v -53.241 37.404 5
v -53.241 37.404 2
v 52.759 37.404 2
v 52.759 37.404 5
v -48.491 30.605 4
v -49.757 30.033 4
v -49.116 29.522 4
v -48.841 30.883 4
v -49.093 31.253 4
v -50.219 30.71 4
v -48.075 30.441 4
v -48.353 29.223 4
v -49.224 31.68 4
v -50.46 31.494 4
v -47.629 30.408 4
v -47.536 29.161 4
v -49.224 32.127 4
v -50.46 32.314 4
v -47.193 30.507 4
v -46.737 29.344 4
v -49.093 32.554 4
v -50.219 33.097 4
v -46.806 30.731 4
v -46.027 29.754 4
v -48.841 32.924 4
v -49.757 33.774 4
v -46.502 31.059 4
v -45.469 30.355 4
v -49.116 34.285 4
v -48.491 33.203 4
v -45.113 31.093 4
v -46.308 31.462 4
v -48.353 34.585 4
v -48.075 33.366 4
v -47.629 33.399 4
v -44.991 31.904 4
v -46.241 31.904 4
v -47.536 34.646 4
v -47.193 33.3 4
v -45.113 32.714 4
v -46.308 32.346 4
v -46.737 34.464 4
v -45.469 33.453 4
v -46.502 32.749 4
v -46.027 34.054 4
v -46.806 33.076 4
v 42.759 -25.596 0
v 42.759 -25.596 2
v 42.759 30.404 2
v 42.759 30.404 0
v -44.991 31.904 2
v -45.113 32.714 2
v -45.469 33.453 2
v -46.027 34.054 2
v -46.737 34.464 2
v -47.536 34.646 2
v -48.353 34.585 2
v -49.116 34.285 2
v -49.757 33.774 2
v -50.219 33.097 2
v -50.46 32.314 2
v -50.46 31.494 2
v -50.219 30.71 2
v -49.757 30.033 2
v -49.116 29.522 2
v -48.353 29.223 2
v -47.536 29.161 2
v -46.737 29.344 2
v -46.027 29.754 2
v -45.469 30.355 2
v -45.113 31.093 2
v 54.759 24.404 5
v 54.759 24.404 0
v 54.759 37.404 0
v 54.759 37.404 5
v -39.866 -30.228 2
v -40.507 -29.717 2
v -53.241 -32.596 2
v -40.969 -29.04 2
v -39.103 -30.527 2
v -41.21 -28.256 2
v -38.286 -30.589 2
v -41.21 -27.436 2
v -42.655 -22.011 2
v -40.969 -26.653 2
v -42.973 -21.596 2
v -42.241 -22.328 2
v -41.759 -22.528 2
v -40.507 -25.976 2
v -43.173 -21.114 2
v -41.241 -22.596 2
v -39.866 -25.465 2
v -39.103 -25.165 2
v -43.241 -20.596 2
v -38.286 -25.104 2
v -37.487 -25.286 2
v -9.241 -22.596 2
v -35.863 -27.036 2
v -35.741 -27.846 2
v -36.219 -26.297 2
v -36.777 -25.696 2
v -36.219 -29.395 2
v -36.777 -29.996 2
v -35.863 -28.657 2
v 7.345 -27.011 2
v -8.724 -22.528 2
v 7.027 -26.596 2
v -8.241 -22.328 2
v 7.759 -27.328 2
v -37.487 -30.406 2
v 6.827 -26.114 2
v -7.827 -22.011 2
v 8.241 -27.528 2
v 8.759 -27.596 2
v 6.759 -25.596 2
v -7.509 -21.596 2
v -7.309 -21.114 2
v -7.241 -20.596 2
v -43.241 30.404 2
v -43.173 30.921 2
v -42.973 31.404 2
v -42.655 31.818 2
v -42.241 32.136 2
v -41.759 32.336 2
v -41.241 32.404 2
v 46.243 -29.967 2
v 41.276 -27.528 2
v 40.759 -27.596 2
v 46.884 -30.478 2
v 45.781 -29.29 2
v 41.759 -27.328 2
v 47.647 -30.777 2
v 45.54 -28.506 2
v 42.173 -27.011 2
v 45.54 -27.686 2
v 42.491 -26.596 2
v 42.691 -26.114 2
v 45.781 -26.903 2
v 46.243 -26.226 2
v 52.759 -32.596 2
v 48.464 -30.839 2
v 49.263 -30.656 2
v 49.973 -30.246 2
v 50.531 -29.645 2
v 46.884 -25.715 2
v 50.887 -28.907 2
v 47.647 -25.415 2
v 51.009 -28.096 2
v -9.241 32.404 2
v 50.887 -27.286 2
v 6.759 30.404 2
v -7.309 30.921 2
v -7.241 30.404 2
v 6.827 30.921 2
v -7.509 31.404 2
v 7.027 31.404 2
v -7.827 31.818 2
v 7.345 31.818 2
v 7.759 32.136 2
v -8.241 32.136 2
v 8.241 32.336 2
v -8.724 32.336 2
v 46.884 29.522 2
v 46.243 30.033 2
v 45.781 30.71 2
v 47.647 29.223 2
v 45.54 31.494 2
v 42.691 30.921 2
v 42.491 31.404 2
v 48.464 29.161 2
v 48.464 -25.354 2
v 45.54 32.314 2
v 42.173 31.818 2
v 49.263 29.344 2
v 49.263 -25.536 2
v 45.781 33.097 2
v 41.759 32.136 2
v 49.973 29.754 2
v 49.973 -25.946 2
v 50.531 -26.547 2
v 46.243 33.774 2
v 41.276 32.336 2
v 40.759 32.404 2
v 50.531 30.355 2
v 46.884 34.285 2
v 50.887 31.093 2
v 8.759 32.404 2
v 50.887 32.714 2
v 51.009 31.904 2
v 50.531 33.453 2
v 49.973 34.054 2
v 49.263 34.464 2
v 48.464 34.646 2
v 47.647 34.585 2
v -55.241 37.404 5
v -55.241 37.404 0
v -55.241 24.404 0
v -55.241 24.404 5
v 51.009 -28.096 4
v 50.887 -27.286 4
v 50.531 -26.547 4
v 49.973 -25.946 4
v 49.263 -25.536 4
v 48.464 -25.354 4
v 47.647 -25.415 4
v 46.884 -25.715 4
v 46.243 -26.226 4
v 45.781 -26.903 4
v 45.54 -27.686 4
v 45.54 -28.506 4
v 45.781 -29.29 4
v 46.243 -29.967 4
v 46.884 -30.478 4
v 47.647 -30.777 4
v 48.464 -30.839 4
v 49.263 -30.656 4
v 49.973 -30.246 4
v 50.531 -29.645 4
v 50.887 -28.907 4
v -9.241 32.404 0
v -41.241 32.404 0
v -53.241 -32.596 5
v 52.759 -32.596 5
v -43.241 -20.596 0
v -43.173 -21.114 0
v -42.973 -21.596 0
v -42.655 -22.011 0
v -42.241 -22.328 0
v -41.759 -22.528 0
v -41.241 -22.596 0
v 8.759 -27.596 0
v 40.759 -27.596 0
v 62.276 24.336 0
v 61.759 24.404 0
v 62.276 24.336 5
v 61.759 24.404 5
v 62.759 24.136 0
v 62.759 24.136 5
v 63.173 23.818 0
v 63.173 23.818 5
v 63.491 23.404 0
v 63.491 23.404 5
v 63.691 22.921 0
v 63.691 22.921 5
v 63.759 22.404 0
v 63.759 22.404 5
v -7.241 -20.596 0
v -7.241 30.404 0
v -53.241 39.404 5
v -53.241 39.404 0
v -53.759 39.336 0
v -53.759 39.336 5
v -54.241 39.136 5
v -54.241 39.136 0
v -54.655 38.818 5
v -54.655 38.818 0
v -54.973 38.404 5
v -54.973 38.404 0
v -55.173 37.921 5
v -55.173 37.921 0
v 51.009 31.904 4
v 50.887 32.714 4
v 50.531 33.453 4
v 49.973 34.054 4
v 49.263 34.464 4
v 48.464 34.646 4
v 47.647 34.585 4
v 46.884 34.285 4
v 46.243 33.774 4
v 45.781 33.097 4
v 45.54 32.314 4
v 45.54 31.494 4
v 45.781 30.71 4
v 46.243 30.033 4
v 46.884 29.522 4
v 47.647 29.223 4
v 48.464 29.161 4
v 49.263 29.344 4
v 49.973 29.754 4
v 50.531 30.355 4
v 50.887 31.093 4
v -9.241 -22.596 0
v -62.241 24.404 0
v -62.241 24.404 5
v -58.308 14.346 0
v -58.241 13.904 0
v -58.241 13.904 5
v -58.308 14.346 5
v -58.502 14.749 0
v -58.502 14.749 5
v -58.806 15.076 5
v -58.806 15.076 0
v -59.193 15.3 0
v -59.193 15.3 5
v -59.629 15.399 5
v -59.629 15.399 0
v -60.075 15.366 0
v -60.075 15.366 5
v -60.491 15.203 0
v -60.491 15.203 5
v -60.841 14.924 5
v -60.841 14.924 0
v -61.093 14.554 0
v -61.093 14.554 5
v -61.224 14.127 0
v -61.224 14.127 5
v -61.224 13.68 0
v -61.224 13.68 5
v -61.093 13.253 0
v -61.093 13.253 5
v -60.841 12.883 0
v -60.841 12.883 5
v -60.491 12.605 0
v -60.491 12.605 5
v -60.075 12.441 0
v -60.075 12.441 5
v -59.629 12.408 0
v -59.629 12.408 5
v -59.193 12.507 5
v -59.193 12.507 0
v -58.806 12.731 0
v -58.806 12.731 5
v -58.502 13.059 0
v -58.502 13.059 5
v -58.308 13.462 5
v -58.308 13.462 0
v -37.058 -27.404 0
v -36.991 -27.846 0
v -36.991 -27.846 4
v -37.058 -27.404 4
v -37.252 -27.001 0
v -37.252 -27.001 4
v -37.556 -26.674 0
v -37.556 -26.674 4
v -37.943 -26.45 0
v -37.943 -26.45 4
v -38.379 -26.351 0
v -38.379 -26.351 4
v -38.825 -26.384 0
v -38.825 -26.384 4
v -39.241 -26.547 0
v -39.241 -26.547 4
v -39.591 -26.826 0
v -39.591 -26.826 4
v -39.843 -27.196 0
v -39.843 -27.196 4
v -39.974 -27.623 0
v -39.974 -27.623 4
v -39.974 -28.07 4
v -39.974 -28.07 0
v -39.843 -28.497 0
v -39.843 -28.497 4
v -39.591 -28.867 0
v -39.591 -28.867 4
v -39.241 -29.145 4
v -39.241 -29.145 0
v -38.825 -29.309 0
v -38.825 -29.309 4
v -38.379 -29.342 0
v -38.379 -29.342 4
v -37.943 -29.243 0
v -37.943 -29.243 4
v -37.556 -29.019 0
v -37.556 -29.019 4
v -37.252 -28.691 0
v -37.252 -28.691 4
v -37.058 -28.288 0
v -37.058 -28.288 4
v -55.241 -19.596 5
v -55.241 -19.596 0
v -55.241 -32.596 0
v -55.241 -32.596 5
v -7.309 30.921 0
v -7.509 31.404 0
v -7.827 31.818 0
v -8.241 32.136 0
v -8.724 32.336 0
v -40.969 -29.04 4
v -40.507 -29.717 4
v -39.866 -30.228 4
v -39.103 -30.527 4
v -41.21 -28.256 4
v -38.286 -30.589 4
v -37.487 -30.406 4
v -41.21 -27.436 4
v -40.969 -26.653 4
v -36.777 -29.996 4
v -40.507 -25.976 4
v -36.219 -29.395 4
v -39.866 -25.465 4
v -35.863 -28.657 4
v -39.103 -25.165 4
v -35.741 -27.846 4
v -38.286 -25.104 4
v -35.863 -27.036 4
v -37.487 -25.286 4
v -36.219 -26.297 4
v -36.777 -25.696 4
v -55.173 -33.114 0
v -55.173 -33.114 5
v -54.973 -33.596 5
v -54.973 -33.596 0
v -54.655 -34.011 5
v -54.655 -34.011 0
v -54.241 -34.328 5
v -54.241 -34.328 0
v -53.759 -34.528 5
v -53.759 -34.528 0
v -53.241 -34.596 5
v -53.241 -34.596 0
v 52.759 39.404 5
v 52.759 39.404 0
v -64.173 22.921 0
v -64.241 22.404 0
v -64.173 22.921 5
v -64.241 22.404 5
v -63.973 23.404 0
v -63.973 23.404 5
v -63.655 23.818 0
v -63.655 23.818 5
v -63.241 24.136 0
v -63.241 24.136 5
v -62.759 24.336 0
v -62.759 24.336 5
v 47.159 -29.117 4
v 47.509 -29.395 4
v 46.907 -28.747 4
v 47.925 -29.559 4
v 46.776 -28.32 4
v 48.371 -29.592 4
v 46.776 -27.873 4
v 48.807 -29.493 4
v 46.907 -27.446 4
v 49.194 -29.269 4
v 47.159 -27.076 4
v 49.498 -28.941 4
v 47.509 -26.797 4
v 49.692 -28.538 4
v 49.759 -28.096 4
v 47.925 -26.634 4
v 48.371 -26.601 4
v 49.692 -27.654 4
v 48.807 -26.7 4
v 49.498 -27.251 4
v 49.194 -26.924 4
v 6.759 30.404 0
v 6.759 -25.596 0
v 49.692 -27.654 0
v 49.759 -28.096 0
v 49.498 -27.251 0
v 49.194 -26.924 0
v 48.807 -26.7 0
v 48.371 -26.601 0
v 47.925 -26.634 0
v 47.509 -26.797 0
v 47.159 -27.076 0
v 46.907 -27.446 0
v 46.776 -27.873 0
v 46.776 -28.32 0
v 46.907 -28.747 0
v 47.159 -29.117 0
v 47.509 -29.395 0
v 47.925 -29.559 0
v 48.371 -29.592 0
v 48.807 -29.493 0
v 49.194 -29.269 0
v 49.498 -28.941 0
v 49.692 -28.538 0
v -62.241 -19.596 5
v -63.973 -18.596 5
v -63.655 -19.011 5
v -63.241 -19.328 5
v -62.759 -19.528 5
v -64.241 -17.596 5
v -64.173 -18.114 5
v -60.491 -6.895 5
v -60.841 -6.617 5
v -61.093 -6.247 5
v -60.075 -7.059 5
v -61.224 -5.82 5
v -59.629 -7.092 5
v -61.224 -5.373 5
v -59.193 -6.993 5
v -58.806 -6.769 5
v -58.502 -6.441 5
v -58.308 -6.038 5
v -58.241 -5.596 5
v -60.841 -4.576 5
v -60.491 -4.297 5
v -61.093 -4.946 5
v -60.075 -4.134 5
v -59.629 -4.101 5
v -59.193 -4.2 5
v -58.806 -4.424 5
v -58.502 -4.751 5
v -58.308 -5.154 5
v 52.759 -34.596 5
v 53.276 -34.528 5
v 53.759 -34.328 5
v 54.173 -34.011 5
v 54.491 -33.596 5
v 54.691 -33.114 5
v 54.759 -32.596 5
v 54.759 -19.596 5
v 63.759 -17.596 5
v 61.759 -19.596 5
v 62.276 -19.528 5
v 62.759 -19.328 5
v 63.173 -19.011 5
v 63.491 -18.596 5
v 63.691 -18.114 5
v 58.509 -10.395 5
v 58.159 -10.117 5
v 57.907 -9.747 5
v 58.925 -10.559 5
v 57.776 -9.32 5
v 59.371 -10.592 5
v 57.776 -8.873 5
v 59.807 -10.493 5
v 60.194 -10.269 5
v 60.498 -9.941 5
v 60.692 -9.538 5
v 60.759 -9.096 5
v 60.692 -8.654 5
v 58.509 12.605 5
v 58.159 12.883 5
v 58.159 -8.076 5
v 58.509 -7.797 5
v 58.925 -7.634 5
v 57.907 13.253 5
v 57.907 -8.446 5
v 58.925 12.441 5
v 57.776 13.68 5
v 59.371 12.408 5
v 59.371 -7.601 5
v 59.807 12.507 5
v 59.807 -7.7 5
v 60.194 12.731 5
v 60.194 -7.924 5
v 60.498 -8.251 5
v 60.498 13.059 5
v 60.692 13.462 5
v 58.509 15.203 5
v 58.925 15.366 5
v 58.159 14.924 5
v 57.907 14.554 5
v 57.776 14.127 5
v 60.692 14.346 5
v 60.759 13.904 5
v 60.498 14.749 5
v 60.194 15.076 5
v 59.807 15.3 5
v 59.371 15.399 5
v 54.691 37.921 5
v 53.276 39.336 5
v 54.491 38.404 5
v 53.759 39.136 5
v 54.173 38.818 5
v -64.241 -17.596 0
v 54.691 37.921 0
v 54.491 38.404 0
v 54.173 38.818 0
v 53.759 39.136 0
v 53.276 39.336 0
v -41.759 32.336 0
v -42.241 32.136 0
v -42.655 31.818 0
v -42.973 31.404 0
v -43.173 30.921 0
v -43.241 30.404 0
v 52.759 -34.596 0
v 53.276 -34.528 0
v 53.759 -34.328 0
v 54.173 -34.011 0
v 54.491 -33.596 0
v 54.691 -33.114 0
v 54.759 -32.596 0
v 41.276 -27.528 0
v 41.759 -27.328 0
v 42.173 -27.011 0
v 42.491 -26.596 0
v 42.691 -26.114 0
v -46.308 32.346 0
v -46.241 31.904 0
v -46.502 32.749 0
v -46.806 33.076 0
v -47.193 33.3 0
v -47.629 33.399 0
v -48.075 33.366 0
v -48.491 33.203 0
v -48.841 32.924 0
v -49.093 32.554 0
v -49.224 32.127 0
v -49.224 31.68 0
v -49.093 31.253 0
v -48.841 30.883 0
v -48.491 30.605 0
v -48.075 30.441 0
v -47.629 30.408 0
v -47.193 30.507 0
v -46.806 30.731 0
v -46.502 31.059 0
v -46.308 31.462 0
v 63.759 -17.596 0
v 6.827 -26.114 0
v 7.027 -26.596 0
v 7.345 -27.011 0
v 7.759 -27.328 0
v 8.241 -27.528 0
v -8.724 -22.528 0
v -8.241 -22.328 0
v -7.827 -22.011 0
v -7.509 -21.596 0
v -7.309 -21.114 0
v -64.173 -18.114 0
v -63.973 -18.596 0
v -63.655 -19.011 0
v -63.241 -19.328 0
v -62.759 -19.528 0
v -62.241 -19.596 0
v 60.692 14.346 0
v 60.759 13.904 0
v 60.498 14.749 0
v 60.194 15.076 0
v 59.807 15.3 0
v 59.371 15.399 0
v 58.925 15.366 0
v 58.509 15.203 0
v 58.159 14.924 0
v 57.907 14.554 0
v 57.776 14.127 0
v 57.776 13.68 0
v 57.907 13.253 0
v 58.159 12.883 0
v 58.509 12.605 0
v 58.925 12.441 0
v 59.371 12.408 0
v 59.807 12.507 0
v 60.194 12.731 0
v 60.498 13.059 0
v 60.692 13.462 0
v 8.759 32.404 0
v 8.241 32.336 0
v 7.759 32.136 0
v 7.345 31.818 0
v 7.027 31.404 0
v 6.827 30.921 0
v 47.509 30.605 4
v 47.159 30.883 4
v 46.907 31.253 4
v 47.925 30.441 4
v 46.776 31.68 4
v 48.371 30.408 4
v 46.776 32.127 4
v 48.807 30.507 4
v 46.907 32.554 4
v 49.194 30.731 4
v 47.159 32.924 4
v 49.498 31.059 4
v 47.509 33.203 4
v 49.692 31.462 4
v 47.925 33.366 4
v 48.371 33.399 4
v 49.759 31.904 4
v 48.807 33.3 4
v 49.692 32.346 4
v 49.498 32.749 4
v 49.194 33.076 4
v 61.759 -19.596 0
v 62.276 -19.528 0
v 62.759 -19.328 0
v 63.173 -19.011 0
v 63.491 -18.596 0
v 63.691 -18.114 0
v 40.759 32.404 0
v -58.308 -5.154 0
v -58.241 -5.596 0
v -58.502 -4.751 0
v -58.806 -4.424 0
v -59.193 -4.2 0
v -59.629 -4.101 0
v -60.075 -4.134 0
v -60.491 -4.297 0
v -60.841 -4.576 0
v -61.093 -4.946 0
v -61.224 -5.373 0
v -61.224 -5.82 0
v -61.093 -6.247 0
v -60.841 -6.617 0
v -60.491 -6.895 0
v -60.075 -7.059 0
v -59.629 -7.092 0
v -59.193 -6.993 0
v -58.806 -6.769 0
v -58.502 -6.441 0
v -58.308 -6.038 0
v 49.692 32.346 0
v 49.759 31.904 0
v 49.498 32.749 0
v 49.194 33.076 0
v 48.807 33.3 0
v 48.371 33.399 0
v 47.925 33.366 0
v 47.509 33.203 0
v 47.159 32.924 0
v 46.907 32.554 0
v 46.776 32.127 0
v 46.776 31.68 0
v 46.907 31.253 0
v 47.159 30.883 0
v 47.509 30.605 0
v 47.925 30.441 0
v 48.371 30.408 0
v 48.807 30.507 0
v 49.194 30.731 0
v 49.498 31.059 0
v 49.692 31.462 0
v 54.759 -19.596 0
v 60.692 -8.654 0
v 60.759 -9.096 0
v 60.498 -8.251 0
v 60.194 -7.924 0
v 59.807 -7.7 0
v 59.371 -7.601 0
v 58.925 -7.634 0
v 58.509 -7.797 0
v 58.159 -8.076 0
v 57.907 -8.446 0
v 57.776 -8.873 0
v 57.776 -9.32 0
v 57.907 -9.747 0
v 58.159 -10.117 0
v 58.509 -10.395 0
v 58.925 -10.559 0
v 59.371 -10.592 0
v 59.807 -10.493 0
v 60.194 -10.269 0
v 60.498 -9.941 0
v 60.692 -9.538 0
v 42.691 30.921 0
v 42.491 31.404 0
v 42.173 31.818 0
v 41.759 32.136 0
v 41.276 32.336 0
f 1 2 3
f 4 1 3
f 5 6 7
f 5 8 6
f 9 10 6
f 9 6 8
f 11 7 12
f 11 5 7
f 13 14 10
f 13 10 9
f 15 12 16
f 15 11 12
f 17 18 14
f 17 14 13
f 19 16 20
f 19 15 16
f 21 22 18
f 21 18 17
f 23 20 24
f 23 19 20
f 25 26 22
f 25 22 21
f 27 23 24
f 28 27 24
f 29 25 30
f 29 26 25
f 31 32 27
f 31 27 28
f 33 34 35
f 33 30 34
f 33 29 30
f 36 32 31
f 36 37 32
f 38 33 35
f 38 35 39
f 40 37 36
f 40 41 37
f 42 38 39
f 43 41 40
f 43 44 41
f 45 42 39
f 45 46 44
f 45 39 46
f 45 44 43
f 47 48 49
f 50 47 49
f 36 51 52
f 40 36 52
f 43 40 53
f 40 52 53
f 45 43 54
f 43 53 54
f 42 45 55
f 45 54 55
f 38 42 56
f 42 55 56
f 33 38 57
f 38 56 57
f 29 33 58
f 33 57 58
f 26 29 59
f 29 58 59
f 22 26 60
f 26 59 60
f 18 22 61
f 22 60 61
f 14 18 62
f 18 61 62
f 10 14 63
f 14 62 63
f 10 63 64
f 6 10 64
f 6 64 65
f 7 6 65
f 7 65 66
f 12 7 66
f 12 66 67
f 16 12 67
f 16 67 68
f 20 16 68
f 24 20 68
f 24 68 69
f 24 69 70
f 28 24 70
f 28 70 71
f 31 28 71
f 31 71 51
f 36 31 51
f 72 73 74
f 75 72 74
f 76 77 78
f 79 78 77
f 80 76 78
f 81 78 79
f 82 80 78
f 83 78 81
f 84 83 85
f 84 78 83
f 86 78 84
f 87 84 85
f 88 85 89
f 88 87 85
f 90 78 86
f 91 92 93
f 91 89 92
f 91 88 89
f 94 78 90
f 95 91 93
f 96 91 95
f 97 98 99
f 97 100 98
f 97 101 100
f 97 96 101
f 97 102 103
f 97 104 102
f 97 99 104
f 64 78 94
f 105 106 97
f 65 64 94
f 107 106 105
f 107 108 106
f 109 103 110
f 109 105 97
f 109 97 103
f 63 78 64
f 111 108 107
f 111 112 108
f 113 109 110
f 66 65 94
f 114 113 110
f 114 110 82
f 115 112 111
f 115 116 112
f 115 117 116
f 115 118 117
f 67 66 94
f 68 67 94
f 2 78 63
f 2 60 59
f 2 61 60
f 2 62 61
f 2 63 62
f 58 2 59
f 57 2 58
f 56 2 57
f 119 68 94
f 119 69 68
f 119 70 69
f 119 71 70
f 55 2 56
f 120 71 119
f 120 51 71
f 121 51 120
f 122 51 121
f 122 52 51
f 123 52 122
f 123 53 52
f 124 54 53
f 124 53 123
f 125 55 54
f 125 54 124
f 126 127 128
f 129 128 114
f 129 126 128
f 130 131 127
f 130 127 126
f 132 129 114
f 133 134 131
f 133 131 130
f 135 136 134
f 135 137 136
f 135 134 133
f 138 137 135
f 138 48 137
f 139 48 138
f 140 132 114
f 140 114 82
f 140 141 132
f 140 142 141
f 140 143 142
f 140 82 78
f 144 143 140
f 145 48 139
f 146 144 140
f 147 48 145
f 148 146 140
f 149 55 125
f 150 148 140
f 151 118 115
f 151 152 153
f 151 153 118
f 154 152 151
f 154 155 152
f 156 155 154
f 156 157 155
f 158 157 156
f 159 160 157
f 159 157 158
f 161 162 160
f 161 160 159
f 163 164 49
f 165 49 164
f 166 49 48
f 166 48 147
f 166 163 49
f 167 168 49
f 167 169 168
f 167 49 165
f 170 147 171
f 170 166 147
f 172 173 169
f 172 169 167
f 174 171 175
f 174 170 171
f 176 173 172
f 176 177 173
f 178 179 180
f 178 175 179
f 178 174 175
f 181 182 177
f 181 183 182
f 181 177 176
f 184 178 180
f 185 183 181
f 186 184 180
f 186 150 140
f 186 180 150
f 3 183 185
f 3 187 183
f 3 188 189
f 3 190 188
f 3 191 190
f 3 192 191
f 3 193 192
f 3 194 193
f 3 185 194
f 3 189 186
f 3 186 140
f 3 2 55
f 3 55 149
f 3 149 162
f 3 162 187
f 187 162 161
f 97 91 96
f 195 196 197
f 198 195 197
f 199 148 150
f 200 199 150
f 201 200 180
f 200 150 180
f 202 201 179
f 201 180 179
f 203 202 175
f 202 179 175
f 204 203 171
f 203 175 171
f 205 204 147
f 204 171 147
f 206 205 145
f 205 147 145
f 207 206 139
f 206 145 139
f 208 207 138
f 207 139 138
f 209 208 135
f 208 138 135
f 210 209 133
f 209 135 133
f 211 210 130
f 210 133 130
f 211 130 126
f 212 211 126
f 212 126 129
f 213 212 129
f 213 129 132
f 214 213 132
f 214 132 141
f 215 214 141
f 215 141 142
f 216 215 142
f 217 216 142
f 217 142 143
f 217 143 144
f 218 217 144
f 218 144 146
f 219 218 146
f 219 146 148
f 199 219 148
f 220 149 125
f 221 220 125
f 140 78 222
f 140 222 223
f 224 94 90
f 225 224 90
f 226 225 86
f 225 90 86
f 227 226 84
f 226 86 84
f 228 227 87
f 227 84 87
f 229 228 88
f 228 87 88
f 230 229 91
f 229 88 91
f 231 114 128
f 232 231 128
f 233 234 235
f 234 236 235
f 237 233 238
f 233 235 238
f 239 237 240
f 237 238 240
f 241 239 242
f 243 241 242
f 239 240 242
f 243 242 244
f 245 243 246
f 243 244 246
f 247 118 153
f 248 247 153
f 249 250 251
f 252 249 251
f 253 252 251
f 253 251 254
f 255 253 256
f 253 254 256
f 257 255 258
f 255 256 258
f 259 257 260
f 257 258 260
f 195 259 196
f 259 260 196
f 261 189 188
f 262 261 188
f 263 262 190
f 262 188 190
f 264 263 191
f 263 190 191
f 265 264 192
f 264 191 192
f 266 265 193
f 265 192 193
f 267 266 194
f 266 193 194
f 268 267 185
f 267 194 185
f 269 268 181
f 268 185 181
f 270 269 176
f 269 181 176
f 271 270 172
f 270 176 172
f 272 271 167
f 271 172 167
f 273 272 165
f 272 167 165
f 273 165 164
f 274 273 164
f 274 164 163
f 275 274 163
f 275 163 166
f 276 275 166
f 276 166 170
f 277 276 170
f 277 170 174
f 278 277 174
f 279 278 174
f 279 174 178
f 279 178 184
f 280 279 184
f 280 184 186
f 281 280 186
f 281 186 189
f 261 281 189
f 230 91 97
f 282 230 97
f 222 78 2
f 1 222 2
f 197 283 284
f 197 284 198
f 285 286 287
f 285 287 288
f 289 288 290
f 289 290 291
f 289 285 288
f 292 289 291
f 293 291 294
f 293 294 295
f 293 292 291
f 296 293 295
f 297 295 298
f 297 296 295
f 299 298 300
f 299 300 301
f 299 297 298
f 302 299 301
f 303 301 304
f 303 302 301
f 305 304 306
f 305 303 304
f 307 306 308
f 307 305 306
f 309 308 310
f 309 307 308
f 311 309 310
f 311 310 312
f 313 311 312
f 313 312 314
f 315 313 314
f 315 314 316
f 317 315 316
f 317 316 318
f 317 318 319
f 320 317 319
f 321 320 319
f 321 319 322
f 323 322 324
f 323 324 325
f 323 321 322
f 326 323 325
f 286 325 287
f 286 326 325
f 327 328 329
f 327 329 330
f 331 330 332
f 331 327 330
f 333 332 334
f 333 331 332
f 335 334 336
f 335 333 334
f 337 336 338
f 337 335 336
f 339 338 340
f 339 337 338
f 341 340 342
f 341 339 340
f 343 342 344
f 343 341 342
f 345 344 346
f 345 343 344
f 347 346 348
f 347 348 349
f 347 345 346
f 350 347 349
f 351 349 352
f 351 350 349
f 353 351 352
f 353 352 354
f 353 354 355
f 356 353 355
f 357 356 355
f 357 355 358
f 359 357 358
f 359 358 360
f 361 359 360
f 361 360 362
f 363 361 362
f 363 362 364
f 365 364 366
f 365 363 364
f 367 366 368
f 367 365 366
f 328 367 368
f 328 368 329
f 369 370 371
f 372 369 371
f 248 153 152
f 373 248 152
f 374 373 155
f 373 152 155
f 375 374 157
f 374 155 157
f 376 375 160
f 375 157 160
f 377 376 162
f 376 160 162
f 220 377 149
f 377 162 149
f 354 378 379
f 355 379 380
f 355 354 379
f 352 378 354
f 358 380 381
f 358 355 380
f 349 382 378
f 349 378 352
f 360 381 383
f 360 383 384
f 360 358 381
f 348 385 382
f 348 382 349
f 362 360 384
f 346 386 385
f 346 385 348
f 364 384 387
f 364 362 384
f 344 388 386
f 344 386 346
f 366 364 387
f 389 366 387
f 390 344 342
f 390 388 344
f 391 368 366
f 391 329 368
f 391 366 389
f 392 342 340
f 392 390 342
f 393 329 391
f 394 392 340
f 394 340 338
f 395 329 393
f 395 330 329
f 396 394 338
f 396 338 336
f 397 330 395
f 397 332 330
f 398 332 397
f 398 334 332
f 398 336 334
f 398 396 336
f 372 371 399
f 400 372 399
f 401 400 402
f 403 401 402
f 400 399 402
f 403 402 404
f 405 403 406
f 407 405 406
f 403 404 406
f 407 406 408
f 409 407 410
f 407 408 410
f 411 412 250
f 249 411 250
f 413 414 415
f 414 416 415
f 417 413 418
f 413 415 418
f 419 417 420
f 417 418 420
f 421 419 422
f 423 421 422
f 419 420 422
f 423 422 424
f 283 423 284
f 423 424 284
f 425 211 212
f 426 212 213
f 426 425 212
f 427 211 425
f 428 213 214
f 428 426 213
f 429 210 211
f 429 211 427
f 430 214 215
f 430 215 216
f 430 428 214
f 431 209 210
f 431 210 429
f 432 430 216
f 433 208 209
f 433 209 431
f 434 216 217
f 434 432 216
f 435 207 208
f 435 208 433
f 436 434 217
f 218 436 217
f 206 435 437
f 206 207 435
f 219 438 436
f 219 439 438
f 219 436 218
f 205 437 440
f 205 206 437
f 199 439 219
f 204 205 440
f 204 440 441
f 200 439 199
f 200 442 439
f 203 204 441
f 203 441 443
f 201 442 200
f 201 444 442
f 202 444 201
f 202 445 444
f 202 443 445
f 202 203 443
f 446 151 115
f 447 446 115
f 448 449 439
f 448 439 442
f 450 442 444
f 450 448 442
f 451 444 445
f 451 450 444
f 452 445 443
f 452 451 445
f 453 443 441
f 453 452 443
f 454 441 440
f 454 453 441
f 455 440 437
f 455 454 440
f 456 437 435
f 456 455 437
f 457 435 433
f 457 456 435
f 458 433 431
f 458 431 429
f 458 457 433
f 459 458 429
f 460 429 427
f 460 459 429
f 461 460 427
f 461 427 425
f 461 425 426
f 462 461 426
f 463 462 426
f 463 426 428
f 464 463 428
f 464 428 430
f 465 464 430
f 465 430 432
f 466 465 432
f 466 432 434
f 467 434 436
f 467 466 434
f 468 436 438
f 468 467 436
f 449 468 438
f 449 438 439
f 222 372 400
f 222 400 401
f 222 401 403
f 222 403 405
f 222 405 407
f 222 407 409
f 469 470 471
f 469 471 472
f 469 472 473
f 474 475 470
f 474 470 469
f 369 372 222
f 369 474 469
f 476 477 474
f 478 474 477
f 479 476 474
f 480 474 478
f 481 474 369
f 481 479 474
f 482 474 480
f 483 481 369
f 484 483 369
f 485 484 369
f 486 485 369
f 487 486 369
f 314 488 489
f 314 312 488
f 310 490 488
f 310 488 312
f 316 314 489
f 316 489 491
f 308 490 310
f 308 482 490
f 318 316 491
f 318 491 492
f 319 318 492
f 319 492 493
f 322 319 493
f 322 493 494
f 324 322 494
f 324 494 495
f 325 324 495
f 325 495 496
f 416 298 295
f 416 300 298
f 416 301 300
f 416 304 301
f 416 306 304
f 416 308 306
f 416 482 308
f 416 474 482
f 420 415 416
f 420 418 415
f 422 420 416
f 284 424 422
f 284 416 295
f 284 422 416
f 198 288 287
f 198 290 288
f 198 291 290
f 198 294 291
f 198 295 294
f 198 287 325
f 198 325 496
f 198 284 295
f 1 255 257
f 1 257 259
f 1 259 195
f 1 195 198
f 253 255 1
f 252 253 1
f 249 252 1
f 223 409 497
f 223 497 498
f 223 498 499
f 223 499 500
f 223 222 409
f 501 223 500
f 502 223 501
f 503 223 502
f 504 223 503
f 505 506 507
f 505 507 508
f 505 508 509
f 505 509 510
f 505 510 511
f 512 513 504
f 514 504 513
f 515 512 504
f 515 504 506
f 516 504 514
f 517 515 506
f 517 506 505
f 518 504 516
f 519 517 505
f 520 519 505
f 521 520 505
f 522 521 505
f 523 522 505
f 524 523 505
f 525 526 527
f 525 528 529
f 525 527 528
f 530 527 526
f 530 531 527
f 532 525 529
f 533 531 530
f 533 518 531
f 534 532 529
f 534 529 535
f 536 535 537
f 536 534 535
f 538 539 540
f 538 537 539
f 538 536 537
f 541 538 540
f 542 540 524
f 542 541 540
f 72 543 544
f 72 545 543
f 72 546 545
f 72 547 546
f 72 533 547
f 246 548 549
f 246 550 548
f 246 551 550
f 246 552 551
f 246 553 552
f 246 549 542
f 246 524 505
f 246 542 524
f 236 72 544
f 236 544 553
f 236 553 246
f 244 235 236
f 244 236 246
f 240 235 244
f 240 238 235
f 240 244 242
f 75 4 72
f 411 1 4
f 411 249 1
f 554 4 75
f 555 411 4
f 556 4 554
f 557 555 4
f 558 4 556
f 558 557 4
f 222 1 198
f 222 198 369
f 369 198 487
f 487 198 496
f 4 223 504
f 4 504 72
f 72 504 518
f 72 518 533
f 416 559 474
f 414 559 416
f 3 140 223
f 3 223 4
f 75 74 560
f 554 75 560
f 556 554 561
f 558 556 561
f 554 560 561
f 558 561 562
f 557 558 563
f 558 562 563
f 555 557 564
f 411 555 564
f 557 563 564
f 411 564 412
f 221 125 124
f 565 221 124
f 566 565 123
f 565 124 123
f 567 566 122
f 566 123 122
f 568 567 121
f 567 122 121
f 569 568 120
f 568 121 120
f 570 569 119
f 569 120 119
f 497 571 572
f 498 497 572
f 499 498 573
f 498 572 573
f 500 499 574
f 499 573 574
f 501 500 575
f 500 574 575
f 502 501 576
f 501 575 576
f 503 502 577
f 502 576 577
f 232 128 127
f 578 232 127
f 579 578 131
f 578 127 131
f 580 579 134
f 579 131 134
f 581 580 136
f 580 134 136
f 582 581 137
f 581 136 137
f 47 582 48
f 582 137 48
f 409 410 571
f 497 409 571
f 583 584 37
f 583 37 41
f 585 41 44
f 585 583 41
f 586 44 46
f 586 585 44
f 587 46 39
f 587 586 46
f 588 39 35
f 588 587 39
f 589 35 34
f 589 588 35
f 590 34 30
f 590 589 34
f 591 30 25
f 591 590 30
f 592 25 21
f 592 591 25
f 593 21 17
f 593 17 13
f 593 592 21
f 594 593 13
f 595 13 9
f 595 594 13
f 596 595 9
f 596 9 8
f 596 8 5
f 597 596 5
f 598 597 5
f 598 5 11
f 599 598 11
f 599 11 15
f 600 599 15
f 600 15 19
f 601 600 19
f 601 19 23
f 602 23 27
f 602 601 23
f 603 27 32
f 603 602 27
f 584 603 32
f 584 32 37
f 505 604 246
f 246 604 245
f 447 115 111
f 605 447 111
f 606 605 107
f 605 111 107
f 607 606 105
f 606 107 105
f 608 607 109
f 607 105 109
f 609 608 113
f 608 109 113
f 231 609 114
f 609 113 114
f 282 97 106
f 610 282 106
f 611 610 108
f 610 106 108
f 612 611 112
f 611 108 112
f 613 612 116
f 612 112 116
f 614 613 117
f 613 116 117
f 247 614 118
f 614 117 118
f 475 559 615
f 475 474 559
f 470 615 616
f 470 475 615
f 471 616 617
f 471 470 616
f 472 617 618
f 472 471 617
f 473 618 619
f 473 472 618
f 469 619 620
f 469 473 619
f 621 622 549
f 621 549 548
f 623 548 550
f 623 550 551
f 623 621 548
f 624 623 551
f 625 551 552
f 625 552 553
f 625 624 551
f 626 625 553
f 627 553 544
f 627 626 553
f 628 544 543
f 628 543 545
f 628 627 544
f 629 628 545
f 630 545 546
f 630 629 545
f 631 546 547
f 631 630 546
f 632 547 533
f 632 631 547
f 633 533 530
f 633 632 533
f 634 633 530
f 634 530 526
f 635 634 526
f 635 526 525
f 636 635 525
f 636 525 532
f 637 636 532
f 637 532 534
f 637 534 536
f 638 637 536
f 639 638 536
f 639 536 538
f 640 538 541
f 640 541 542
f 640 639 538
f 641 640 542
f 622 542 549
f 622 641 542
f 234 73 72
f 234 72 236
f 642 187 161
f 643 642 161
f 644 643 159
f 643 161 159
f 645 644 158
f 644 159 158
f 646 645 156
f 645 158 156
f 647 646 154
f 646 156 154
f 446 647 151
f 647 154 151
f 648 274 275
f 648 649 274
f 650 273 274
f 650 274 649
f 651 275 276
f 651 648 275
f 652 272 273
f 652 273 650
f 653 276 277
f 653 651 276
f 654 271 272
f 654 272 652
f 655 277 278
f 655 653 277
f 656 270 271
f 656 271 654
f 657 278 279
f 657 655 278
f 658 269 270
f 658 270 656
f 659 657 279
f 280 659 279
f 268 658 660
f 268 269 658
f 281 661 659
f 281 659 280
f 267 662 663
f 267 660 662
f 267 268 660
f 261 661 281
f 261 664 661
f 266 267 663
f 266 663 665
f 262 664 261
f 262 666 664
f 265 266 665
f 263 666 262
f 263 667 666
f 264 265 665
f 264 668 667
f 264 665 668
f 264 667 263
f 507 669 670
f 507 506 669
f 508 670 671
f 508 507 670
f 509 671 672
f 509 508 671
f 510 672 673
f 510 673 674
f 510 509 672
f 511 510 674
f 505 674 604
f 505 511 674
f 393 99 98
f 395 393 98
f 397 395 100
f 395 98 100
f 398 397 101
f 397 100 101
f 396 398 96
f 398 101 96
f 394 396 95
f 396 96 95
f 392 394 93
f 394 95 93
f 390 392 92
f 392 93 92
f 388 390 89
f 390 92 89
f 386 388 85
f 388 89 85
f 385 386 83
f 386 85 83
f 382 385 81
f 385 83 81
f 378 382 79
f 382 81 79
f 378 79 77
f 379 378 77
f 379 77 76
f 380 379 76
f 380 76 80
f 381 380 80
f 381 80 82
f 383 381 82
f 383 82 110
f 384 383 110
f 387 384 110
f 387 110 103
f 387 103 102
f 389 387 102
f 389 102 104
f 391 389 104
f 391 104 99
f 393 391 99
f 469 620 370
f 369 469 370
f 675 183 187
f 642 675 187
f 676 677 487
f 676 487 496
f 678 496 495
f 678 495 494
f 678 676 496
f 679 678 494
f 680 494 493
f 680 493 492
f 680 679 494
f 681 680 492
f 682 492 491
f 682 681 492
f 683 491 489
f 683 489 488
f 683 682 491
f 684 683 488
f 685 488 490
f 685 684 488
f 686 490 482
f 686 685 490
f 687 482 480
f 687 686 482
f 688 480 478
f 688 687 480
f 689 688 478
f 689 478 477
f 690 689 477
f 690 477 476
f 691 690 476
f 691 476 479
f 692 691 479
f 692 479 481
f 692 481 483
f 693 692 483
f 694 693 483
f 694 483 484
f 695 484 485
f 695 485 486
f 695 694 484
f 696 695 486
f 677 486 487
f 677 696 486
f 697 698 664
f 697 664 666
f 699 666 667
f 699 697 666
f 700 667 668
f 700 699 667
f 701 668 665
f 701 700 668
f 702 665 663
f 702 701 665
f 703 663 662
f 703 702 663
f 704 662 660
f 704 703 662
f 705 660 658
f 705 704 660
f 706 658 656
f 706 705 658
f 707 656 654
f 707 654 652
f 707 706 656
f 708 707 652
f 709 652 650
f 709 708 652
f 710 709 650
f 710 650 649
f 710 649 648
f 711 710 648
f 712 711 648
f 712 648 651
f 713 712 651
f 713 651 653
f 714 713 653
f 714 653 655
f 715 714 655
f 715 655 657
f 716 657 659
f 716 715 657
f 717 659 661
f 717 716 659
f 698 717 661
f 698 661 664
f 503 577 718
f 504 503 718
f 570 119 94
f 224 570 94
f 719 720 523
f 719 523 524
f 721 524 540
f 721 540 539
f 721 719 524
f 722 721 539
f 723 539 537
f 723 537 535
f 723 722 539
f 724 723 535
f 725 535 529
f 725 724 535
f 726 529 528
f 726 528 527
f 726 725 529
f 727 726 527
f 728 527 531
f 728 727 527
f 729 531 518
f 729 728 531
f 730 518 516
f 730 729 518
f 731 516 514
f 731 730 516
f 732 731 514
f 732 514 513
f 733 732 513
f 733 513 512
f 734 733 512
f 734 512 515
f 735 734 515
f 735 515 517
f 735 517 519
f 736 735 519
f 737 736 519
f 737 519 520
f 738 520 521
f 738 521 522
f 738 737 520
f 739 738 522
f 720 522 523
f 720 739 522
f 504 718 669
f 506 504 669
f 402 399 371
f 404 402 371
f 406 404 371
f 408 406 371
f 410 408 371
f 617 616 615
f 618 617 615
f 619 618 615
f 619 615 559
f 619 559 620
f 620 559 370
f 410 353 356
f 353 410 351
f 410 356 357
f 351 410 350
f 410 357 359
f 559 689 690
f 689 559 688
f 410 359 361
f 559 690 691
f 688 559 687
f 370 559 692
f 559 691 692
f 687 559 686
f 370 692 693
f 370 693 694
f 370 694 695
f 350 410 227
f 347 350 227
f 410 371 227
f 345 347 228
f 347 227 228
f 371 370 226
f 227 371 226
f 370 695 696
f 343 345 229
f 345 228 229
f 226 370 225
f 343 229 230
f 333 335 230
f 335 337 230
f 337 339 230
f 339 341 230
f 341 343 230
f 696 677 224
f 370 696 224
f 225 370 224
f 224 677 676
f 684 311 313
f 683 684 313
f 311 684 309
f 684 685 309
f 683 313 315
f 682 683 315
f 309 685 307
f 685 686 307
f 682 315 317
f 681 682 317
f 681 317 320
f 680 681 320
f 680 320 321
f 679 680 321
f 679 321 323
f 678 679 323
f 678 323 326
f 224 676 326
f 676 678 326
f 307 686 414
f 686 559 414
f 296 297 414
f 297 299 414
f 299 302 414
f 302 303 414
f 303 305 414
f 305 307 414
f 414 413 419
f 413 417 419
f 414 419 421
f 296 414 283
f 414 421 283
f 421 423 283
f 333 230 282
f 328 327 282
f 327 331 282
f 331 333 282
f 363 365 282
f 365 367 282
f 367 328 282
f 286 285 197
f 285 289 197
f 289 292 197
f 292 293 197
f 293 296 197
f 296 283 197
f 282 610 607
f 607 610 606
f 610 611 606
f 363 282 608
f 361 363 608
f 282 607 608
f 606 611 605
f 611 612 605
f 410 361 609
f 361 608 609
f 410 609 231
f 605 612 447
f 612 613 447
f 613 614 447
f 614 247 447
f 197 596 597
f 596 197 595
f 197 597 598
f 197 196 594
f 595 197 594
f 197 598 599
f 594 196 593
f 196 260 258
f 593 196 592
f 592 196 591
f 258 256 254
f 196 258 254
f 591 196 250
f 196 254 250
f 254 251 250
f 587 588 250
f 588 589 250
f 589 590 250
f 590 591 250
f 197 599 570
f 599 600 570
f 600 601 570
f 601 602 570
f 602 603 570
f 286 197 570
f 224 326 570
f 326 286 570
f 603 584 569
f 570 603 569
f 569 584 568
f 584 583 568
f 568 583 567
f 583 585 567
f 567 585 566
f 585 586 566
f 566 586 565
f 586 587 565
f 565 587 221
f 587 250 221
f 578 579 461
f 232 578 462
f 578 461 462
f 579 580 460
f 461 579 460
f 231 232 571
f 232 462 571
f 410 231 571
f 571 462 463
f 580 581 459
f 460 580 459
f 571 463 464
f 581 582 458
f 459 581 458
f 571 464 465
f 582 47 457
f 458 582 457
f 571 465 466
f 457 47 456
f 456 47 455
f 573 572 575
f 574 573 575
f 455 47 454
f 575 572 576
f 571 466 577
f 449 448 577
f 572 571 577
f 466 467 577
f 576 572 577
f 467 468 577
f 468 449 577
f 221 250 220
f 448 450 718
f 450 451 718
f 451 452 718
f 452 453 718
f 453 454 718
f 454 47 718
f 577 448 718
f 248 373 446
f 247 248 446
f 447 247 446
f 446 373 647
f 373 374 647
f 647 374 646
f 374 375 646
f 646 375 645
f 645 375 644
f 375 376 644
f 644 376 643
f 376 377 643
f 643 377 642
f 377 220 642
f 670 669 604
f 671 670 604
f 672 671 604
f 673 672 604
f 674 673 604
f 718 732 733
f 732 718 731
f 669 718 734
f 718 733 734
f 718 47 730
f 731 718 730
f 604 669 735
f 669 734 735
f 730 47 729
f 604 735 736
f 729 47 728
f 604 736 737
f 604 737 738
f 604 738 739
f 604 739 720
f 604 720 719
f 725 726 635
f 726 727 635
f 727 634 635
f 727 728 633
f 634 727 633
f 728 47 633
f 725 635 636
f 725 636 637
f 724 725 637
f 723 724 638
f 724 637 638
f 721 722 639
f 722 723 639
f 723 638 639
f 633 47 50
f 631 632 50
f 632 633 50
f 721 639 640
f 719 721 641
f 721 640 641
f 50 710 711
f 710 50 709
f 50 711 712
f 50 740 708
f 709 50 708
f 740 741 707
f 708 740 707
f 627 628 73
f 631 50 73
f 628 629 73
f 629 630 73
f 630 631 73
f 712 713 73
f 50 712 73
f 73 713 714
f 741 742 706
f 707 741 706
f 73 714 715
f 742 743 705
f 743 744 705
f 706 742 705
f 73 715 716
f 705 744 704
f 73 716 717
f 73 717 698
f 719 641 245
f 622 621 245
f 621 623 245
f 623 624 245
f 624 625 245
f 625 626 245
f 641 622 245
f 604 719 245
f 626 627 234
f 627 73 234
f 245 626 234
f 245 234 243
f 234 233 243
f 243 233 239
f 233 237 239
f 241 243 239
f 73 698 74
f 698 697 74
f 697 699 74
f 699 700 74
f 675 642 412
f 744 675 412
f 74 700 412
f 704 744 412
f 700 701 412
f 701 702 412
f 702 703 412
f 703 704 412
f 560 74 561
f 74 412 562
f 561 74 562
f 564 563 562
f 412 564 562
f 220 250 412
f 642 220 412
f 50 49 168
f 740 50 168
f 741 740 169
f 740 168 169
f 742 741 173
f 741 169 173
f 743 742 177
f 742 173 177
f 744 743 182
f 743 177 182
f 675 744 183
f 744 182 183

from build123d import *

# Parameters (mm, degrees)
F0_W     = 106
F0_H     = 70
F0_R     = 2.75
F1_DEPTH = 2
F0_R_2   = 1.5
F2_DEPTH = 4
F0_W_2   = 9
F0_H_2   = 44
F3_DEPTH = 5
F4_R     = 2
F6_DEPTH = 2


with BuildPart() as f1:
    # F0 (on Top) → F1 (new body)
    with BuildSketch(Plane.XY):
        with Locations((-0.241208, 2.403659)):
            Rectangle(F0_W, F0_H)
        with Locations((-38.491208, -27.846341)):
            Circle(F0_R, mode=Mode.SUBTRACT)
        with Locations((48.258792, -28.096341)):
            Circle(F0_R, mode=Mode.SUBTRACT)
        with Locations((-47.741208, 31.903659)):
            Circle(F0_R, mode=Mode.SUBTRACT)
        with Locations((48.258792, 31.903659)):
            Circle(F0_R, mode=Mode.SUBTRACT)
    extrude(amount=F1_DEPTH)

    # F0 (on Top) → F2 (join)
    with BuildSketch(Plane.XY):
        with Locations((-47.741208, 31.903659)):
            Circle(F0_R)
        with Locations((-47.741208, 31.903659)):
            Circle(F0_R_2, mode=Mode.SUBTRACT)
        with Locations((-38.491208, -27.846341)):
            Circle(F0_R)
        with Locations((-38.491208, -27.846341)):
            Circle(F0_R_2, mode=Mode.SUBTRACT)
        with Locations((48.258792, -28.096341)):
            Circle(F0_R)
        with Locations((48.258792, -28.096341)):
            Circle(F0_R_2, mode=Mode.SUBTRACT)
        with Locations((48.258792, 31.903659)):
            Circle(F0_R)
        with Locations((48.258792, 31.903659)):
            Circle(F0_R_2, mode=Mode.SUBTRACT)
    extrude(amount=F2_DEPTH)

    # F0 (on Top) → F3 (join)
    with BuildSketch(Plane.XY):
        with Locations((-59.741208, 2.403659)):
            Rectangle(F0_W_2, F0_H_2)
        with Locations((-59.741208, -5.596341)):
            Circle(F0_R_2, mode=Mode.SUBTRACT)
        with Locations((-59.741208, 13.903659)):
            Circle(F0_R_2, mode=Mode.SUBTRACT)
        with BuildLine():
            ThreePointArc((-53.241208, 39.403659), (-54.655421, 38.817872), (-55.241208, 37.403659))
            Line((-55.241208, 37.403659), (-55.241208, 24.403659))
            Line((-55.241208, 24.403659), (-55.241208, -19.596341))
            Line((-55.241208, -19.596341), (-55.241208, -32.596341))
            ThreePointArc((-55.241208, -32.596341), (-54.655421, -34.010555), (-53.241208, -34.596341))
            Line((-53.241208, -34.596341), (52.758792, -34.596341))
            ThreePointArc((52.758792, -34.596341), (54.173006, -34.010555), (54.758792, -32.596341))
            Line((54.758792, -32.596341), (54.758792, -19.596341))
            Line((54.758792, -19.596341), (54.758792, 24.403659))
            Line((54.758792, 24.403659), (54.758792, 37.403659))
            ThreePointArc((54.758792, 37.403659), (54.173006, 38.817872), (52.758792, 39.403659))
            Line((52.758792, 39.403659), (-53.241208, 39.403659))
        make_face()
        with Locations((-0.241208, 2.403659)):
            Rectangle(F0_W, F0_H, mode=Mode.SUBTRACT)
        with Locations((59.258792, 2.403659)):
            Rectangle(F0_W_2, F0_H_2)
        with Locations((59.258792, -9.096341)):
            Circle(F0_R_2, mode=Mode.SUBTRACT)
        with Locations((59.258792, 13.903659)):
            Circle(F0_R_2, mode=Mode.SUBTRACT)
    extrude(amount=F3_DEPTH)

    # F4
    f4_edges = [f1.edges().sort_by_distance(p)[0] for p in [
        (-64.241208, 24.403659, 2.5),
        (-64.241208, -19.596341, 2.5),
        (63.758792, -19.596341, 2.5),
        (63.758792, 24.403659, 2.5),
    ]]
    fillet(f4_edges, radius=F4_R)

    # F5 (on face) → F6 (cut)
    with BuildSketch(Plane.XY.offset(2)):
        with BuildLine():
            Line((8.758792, -27.596341), (40.758792, -27.596341))
            ThreePointArc((40.758792, -27.596341), (42.173006, -27.010555), (42.758792, -25.596341))
            Line((42.758792, -25.596341), (42.758792, 30.403659))
            ThreePointArc((42.758792, 30.403659), (42.173006, 31.817872), (40.758792, 32.403659))
            Line((40.758792, 32.403659), (8.758792, 32.403659))
            ThreePointArc((8.758792, 32.403659), (7.344579, 31.817872), (6.758792, 30.403659))
            Line((6.758792, 30.403659), (6.758792, -25.596341))
            ThreePointArc((6.758792, -25.596341), (7.344579, -27.010555), (8.758792, -27.596341))
        make_face()
        with BuildLine():
            Line((-41.241208, -22.596341), (-9.241208, -22.596341))
            ThreePointArc((-9.241208, -22.596341), (-7.826994, -22.010555), (-7.241208, -20.596341))
            Line((-7.241208, -20.596341), (-7.241208, 30.403659))
            ThreePointArc((-7.241208, 30.403659), (-7.826994, 31.817872), (-9.241208, 32.403659))
            Line((-9.241208, 32.403659), (-41.241208, 32.403659))
            ThreePointArc((-41.241208, 32.403659), (-42.655421, 31.817872), (-43.241208, 30.403659))
            Line((-43.241208, 30.403659), (-43.241208, -20.596341))
            ThreePointArc((-43.241208, -20.596341), (-42.655421, -22.010555), (-41.241208, -22.596341))
        make_face()
    extrude(amount=-F6_DEPTH, mode=Mode.SUBTRACT)


solid = f1.part
